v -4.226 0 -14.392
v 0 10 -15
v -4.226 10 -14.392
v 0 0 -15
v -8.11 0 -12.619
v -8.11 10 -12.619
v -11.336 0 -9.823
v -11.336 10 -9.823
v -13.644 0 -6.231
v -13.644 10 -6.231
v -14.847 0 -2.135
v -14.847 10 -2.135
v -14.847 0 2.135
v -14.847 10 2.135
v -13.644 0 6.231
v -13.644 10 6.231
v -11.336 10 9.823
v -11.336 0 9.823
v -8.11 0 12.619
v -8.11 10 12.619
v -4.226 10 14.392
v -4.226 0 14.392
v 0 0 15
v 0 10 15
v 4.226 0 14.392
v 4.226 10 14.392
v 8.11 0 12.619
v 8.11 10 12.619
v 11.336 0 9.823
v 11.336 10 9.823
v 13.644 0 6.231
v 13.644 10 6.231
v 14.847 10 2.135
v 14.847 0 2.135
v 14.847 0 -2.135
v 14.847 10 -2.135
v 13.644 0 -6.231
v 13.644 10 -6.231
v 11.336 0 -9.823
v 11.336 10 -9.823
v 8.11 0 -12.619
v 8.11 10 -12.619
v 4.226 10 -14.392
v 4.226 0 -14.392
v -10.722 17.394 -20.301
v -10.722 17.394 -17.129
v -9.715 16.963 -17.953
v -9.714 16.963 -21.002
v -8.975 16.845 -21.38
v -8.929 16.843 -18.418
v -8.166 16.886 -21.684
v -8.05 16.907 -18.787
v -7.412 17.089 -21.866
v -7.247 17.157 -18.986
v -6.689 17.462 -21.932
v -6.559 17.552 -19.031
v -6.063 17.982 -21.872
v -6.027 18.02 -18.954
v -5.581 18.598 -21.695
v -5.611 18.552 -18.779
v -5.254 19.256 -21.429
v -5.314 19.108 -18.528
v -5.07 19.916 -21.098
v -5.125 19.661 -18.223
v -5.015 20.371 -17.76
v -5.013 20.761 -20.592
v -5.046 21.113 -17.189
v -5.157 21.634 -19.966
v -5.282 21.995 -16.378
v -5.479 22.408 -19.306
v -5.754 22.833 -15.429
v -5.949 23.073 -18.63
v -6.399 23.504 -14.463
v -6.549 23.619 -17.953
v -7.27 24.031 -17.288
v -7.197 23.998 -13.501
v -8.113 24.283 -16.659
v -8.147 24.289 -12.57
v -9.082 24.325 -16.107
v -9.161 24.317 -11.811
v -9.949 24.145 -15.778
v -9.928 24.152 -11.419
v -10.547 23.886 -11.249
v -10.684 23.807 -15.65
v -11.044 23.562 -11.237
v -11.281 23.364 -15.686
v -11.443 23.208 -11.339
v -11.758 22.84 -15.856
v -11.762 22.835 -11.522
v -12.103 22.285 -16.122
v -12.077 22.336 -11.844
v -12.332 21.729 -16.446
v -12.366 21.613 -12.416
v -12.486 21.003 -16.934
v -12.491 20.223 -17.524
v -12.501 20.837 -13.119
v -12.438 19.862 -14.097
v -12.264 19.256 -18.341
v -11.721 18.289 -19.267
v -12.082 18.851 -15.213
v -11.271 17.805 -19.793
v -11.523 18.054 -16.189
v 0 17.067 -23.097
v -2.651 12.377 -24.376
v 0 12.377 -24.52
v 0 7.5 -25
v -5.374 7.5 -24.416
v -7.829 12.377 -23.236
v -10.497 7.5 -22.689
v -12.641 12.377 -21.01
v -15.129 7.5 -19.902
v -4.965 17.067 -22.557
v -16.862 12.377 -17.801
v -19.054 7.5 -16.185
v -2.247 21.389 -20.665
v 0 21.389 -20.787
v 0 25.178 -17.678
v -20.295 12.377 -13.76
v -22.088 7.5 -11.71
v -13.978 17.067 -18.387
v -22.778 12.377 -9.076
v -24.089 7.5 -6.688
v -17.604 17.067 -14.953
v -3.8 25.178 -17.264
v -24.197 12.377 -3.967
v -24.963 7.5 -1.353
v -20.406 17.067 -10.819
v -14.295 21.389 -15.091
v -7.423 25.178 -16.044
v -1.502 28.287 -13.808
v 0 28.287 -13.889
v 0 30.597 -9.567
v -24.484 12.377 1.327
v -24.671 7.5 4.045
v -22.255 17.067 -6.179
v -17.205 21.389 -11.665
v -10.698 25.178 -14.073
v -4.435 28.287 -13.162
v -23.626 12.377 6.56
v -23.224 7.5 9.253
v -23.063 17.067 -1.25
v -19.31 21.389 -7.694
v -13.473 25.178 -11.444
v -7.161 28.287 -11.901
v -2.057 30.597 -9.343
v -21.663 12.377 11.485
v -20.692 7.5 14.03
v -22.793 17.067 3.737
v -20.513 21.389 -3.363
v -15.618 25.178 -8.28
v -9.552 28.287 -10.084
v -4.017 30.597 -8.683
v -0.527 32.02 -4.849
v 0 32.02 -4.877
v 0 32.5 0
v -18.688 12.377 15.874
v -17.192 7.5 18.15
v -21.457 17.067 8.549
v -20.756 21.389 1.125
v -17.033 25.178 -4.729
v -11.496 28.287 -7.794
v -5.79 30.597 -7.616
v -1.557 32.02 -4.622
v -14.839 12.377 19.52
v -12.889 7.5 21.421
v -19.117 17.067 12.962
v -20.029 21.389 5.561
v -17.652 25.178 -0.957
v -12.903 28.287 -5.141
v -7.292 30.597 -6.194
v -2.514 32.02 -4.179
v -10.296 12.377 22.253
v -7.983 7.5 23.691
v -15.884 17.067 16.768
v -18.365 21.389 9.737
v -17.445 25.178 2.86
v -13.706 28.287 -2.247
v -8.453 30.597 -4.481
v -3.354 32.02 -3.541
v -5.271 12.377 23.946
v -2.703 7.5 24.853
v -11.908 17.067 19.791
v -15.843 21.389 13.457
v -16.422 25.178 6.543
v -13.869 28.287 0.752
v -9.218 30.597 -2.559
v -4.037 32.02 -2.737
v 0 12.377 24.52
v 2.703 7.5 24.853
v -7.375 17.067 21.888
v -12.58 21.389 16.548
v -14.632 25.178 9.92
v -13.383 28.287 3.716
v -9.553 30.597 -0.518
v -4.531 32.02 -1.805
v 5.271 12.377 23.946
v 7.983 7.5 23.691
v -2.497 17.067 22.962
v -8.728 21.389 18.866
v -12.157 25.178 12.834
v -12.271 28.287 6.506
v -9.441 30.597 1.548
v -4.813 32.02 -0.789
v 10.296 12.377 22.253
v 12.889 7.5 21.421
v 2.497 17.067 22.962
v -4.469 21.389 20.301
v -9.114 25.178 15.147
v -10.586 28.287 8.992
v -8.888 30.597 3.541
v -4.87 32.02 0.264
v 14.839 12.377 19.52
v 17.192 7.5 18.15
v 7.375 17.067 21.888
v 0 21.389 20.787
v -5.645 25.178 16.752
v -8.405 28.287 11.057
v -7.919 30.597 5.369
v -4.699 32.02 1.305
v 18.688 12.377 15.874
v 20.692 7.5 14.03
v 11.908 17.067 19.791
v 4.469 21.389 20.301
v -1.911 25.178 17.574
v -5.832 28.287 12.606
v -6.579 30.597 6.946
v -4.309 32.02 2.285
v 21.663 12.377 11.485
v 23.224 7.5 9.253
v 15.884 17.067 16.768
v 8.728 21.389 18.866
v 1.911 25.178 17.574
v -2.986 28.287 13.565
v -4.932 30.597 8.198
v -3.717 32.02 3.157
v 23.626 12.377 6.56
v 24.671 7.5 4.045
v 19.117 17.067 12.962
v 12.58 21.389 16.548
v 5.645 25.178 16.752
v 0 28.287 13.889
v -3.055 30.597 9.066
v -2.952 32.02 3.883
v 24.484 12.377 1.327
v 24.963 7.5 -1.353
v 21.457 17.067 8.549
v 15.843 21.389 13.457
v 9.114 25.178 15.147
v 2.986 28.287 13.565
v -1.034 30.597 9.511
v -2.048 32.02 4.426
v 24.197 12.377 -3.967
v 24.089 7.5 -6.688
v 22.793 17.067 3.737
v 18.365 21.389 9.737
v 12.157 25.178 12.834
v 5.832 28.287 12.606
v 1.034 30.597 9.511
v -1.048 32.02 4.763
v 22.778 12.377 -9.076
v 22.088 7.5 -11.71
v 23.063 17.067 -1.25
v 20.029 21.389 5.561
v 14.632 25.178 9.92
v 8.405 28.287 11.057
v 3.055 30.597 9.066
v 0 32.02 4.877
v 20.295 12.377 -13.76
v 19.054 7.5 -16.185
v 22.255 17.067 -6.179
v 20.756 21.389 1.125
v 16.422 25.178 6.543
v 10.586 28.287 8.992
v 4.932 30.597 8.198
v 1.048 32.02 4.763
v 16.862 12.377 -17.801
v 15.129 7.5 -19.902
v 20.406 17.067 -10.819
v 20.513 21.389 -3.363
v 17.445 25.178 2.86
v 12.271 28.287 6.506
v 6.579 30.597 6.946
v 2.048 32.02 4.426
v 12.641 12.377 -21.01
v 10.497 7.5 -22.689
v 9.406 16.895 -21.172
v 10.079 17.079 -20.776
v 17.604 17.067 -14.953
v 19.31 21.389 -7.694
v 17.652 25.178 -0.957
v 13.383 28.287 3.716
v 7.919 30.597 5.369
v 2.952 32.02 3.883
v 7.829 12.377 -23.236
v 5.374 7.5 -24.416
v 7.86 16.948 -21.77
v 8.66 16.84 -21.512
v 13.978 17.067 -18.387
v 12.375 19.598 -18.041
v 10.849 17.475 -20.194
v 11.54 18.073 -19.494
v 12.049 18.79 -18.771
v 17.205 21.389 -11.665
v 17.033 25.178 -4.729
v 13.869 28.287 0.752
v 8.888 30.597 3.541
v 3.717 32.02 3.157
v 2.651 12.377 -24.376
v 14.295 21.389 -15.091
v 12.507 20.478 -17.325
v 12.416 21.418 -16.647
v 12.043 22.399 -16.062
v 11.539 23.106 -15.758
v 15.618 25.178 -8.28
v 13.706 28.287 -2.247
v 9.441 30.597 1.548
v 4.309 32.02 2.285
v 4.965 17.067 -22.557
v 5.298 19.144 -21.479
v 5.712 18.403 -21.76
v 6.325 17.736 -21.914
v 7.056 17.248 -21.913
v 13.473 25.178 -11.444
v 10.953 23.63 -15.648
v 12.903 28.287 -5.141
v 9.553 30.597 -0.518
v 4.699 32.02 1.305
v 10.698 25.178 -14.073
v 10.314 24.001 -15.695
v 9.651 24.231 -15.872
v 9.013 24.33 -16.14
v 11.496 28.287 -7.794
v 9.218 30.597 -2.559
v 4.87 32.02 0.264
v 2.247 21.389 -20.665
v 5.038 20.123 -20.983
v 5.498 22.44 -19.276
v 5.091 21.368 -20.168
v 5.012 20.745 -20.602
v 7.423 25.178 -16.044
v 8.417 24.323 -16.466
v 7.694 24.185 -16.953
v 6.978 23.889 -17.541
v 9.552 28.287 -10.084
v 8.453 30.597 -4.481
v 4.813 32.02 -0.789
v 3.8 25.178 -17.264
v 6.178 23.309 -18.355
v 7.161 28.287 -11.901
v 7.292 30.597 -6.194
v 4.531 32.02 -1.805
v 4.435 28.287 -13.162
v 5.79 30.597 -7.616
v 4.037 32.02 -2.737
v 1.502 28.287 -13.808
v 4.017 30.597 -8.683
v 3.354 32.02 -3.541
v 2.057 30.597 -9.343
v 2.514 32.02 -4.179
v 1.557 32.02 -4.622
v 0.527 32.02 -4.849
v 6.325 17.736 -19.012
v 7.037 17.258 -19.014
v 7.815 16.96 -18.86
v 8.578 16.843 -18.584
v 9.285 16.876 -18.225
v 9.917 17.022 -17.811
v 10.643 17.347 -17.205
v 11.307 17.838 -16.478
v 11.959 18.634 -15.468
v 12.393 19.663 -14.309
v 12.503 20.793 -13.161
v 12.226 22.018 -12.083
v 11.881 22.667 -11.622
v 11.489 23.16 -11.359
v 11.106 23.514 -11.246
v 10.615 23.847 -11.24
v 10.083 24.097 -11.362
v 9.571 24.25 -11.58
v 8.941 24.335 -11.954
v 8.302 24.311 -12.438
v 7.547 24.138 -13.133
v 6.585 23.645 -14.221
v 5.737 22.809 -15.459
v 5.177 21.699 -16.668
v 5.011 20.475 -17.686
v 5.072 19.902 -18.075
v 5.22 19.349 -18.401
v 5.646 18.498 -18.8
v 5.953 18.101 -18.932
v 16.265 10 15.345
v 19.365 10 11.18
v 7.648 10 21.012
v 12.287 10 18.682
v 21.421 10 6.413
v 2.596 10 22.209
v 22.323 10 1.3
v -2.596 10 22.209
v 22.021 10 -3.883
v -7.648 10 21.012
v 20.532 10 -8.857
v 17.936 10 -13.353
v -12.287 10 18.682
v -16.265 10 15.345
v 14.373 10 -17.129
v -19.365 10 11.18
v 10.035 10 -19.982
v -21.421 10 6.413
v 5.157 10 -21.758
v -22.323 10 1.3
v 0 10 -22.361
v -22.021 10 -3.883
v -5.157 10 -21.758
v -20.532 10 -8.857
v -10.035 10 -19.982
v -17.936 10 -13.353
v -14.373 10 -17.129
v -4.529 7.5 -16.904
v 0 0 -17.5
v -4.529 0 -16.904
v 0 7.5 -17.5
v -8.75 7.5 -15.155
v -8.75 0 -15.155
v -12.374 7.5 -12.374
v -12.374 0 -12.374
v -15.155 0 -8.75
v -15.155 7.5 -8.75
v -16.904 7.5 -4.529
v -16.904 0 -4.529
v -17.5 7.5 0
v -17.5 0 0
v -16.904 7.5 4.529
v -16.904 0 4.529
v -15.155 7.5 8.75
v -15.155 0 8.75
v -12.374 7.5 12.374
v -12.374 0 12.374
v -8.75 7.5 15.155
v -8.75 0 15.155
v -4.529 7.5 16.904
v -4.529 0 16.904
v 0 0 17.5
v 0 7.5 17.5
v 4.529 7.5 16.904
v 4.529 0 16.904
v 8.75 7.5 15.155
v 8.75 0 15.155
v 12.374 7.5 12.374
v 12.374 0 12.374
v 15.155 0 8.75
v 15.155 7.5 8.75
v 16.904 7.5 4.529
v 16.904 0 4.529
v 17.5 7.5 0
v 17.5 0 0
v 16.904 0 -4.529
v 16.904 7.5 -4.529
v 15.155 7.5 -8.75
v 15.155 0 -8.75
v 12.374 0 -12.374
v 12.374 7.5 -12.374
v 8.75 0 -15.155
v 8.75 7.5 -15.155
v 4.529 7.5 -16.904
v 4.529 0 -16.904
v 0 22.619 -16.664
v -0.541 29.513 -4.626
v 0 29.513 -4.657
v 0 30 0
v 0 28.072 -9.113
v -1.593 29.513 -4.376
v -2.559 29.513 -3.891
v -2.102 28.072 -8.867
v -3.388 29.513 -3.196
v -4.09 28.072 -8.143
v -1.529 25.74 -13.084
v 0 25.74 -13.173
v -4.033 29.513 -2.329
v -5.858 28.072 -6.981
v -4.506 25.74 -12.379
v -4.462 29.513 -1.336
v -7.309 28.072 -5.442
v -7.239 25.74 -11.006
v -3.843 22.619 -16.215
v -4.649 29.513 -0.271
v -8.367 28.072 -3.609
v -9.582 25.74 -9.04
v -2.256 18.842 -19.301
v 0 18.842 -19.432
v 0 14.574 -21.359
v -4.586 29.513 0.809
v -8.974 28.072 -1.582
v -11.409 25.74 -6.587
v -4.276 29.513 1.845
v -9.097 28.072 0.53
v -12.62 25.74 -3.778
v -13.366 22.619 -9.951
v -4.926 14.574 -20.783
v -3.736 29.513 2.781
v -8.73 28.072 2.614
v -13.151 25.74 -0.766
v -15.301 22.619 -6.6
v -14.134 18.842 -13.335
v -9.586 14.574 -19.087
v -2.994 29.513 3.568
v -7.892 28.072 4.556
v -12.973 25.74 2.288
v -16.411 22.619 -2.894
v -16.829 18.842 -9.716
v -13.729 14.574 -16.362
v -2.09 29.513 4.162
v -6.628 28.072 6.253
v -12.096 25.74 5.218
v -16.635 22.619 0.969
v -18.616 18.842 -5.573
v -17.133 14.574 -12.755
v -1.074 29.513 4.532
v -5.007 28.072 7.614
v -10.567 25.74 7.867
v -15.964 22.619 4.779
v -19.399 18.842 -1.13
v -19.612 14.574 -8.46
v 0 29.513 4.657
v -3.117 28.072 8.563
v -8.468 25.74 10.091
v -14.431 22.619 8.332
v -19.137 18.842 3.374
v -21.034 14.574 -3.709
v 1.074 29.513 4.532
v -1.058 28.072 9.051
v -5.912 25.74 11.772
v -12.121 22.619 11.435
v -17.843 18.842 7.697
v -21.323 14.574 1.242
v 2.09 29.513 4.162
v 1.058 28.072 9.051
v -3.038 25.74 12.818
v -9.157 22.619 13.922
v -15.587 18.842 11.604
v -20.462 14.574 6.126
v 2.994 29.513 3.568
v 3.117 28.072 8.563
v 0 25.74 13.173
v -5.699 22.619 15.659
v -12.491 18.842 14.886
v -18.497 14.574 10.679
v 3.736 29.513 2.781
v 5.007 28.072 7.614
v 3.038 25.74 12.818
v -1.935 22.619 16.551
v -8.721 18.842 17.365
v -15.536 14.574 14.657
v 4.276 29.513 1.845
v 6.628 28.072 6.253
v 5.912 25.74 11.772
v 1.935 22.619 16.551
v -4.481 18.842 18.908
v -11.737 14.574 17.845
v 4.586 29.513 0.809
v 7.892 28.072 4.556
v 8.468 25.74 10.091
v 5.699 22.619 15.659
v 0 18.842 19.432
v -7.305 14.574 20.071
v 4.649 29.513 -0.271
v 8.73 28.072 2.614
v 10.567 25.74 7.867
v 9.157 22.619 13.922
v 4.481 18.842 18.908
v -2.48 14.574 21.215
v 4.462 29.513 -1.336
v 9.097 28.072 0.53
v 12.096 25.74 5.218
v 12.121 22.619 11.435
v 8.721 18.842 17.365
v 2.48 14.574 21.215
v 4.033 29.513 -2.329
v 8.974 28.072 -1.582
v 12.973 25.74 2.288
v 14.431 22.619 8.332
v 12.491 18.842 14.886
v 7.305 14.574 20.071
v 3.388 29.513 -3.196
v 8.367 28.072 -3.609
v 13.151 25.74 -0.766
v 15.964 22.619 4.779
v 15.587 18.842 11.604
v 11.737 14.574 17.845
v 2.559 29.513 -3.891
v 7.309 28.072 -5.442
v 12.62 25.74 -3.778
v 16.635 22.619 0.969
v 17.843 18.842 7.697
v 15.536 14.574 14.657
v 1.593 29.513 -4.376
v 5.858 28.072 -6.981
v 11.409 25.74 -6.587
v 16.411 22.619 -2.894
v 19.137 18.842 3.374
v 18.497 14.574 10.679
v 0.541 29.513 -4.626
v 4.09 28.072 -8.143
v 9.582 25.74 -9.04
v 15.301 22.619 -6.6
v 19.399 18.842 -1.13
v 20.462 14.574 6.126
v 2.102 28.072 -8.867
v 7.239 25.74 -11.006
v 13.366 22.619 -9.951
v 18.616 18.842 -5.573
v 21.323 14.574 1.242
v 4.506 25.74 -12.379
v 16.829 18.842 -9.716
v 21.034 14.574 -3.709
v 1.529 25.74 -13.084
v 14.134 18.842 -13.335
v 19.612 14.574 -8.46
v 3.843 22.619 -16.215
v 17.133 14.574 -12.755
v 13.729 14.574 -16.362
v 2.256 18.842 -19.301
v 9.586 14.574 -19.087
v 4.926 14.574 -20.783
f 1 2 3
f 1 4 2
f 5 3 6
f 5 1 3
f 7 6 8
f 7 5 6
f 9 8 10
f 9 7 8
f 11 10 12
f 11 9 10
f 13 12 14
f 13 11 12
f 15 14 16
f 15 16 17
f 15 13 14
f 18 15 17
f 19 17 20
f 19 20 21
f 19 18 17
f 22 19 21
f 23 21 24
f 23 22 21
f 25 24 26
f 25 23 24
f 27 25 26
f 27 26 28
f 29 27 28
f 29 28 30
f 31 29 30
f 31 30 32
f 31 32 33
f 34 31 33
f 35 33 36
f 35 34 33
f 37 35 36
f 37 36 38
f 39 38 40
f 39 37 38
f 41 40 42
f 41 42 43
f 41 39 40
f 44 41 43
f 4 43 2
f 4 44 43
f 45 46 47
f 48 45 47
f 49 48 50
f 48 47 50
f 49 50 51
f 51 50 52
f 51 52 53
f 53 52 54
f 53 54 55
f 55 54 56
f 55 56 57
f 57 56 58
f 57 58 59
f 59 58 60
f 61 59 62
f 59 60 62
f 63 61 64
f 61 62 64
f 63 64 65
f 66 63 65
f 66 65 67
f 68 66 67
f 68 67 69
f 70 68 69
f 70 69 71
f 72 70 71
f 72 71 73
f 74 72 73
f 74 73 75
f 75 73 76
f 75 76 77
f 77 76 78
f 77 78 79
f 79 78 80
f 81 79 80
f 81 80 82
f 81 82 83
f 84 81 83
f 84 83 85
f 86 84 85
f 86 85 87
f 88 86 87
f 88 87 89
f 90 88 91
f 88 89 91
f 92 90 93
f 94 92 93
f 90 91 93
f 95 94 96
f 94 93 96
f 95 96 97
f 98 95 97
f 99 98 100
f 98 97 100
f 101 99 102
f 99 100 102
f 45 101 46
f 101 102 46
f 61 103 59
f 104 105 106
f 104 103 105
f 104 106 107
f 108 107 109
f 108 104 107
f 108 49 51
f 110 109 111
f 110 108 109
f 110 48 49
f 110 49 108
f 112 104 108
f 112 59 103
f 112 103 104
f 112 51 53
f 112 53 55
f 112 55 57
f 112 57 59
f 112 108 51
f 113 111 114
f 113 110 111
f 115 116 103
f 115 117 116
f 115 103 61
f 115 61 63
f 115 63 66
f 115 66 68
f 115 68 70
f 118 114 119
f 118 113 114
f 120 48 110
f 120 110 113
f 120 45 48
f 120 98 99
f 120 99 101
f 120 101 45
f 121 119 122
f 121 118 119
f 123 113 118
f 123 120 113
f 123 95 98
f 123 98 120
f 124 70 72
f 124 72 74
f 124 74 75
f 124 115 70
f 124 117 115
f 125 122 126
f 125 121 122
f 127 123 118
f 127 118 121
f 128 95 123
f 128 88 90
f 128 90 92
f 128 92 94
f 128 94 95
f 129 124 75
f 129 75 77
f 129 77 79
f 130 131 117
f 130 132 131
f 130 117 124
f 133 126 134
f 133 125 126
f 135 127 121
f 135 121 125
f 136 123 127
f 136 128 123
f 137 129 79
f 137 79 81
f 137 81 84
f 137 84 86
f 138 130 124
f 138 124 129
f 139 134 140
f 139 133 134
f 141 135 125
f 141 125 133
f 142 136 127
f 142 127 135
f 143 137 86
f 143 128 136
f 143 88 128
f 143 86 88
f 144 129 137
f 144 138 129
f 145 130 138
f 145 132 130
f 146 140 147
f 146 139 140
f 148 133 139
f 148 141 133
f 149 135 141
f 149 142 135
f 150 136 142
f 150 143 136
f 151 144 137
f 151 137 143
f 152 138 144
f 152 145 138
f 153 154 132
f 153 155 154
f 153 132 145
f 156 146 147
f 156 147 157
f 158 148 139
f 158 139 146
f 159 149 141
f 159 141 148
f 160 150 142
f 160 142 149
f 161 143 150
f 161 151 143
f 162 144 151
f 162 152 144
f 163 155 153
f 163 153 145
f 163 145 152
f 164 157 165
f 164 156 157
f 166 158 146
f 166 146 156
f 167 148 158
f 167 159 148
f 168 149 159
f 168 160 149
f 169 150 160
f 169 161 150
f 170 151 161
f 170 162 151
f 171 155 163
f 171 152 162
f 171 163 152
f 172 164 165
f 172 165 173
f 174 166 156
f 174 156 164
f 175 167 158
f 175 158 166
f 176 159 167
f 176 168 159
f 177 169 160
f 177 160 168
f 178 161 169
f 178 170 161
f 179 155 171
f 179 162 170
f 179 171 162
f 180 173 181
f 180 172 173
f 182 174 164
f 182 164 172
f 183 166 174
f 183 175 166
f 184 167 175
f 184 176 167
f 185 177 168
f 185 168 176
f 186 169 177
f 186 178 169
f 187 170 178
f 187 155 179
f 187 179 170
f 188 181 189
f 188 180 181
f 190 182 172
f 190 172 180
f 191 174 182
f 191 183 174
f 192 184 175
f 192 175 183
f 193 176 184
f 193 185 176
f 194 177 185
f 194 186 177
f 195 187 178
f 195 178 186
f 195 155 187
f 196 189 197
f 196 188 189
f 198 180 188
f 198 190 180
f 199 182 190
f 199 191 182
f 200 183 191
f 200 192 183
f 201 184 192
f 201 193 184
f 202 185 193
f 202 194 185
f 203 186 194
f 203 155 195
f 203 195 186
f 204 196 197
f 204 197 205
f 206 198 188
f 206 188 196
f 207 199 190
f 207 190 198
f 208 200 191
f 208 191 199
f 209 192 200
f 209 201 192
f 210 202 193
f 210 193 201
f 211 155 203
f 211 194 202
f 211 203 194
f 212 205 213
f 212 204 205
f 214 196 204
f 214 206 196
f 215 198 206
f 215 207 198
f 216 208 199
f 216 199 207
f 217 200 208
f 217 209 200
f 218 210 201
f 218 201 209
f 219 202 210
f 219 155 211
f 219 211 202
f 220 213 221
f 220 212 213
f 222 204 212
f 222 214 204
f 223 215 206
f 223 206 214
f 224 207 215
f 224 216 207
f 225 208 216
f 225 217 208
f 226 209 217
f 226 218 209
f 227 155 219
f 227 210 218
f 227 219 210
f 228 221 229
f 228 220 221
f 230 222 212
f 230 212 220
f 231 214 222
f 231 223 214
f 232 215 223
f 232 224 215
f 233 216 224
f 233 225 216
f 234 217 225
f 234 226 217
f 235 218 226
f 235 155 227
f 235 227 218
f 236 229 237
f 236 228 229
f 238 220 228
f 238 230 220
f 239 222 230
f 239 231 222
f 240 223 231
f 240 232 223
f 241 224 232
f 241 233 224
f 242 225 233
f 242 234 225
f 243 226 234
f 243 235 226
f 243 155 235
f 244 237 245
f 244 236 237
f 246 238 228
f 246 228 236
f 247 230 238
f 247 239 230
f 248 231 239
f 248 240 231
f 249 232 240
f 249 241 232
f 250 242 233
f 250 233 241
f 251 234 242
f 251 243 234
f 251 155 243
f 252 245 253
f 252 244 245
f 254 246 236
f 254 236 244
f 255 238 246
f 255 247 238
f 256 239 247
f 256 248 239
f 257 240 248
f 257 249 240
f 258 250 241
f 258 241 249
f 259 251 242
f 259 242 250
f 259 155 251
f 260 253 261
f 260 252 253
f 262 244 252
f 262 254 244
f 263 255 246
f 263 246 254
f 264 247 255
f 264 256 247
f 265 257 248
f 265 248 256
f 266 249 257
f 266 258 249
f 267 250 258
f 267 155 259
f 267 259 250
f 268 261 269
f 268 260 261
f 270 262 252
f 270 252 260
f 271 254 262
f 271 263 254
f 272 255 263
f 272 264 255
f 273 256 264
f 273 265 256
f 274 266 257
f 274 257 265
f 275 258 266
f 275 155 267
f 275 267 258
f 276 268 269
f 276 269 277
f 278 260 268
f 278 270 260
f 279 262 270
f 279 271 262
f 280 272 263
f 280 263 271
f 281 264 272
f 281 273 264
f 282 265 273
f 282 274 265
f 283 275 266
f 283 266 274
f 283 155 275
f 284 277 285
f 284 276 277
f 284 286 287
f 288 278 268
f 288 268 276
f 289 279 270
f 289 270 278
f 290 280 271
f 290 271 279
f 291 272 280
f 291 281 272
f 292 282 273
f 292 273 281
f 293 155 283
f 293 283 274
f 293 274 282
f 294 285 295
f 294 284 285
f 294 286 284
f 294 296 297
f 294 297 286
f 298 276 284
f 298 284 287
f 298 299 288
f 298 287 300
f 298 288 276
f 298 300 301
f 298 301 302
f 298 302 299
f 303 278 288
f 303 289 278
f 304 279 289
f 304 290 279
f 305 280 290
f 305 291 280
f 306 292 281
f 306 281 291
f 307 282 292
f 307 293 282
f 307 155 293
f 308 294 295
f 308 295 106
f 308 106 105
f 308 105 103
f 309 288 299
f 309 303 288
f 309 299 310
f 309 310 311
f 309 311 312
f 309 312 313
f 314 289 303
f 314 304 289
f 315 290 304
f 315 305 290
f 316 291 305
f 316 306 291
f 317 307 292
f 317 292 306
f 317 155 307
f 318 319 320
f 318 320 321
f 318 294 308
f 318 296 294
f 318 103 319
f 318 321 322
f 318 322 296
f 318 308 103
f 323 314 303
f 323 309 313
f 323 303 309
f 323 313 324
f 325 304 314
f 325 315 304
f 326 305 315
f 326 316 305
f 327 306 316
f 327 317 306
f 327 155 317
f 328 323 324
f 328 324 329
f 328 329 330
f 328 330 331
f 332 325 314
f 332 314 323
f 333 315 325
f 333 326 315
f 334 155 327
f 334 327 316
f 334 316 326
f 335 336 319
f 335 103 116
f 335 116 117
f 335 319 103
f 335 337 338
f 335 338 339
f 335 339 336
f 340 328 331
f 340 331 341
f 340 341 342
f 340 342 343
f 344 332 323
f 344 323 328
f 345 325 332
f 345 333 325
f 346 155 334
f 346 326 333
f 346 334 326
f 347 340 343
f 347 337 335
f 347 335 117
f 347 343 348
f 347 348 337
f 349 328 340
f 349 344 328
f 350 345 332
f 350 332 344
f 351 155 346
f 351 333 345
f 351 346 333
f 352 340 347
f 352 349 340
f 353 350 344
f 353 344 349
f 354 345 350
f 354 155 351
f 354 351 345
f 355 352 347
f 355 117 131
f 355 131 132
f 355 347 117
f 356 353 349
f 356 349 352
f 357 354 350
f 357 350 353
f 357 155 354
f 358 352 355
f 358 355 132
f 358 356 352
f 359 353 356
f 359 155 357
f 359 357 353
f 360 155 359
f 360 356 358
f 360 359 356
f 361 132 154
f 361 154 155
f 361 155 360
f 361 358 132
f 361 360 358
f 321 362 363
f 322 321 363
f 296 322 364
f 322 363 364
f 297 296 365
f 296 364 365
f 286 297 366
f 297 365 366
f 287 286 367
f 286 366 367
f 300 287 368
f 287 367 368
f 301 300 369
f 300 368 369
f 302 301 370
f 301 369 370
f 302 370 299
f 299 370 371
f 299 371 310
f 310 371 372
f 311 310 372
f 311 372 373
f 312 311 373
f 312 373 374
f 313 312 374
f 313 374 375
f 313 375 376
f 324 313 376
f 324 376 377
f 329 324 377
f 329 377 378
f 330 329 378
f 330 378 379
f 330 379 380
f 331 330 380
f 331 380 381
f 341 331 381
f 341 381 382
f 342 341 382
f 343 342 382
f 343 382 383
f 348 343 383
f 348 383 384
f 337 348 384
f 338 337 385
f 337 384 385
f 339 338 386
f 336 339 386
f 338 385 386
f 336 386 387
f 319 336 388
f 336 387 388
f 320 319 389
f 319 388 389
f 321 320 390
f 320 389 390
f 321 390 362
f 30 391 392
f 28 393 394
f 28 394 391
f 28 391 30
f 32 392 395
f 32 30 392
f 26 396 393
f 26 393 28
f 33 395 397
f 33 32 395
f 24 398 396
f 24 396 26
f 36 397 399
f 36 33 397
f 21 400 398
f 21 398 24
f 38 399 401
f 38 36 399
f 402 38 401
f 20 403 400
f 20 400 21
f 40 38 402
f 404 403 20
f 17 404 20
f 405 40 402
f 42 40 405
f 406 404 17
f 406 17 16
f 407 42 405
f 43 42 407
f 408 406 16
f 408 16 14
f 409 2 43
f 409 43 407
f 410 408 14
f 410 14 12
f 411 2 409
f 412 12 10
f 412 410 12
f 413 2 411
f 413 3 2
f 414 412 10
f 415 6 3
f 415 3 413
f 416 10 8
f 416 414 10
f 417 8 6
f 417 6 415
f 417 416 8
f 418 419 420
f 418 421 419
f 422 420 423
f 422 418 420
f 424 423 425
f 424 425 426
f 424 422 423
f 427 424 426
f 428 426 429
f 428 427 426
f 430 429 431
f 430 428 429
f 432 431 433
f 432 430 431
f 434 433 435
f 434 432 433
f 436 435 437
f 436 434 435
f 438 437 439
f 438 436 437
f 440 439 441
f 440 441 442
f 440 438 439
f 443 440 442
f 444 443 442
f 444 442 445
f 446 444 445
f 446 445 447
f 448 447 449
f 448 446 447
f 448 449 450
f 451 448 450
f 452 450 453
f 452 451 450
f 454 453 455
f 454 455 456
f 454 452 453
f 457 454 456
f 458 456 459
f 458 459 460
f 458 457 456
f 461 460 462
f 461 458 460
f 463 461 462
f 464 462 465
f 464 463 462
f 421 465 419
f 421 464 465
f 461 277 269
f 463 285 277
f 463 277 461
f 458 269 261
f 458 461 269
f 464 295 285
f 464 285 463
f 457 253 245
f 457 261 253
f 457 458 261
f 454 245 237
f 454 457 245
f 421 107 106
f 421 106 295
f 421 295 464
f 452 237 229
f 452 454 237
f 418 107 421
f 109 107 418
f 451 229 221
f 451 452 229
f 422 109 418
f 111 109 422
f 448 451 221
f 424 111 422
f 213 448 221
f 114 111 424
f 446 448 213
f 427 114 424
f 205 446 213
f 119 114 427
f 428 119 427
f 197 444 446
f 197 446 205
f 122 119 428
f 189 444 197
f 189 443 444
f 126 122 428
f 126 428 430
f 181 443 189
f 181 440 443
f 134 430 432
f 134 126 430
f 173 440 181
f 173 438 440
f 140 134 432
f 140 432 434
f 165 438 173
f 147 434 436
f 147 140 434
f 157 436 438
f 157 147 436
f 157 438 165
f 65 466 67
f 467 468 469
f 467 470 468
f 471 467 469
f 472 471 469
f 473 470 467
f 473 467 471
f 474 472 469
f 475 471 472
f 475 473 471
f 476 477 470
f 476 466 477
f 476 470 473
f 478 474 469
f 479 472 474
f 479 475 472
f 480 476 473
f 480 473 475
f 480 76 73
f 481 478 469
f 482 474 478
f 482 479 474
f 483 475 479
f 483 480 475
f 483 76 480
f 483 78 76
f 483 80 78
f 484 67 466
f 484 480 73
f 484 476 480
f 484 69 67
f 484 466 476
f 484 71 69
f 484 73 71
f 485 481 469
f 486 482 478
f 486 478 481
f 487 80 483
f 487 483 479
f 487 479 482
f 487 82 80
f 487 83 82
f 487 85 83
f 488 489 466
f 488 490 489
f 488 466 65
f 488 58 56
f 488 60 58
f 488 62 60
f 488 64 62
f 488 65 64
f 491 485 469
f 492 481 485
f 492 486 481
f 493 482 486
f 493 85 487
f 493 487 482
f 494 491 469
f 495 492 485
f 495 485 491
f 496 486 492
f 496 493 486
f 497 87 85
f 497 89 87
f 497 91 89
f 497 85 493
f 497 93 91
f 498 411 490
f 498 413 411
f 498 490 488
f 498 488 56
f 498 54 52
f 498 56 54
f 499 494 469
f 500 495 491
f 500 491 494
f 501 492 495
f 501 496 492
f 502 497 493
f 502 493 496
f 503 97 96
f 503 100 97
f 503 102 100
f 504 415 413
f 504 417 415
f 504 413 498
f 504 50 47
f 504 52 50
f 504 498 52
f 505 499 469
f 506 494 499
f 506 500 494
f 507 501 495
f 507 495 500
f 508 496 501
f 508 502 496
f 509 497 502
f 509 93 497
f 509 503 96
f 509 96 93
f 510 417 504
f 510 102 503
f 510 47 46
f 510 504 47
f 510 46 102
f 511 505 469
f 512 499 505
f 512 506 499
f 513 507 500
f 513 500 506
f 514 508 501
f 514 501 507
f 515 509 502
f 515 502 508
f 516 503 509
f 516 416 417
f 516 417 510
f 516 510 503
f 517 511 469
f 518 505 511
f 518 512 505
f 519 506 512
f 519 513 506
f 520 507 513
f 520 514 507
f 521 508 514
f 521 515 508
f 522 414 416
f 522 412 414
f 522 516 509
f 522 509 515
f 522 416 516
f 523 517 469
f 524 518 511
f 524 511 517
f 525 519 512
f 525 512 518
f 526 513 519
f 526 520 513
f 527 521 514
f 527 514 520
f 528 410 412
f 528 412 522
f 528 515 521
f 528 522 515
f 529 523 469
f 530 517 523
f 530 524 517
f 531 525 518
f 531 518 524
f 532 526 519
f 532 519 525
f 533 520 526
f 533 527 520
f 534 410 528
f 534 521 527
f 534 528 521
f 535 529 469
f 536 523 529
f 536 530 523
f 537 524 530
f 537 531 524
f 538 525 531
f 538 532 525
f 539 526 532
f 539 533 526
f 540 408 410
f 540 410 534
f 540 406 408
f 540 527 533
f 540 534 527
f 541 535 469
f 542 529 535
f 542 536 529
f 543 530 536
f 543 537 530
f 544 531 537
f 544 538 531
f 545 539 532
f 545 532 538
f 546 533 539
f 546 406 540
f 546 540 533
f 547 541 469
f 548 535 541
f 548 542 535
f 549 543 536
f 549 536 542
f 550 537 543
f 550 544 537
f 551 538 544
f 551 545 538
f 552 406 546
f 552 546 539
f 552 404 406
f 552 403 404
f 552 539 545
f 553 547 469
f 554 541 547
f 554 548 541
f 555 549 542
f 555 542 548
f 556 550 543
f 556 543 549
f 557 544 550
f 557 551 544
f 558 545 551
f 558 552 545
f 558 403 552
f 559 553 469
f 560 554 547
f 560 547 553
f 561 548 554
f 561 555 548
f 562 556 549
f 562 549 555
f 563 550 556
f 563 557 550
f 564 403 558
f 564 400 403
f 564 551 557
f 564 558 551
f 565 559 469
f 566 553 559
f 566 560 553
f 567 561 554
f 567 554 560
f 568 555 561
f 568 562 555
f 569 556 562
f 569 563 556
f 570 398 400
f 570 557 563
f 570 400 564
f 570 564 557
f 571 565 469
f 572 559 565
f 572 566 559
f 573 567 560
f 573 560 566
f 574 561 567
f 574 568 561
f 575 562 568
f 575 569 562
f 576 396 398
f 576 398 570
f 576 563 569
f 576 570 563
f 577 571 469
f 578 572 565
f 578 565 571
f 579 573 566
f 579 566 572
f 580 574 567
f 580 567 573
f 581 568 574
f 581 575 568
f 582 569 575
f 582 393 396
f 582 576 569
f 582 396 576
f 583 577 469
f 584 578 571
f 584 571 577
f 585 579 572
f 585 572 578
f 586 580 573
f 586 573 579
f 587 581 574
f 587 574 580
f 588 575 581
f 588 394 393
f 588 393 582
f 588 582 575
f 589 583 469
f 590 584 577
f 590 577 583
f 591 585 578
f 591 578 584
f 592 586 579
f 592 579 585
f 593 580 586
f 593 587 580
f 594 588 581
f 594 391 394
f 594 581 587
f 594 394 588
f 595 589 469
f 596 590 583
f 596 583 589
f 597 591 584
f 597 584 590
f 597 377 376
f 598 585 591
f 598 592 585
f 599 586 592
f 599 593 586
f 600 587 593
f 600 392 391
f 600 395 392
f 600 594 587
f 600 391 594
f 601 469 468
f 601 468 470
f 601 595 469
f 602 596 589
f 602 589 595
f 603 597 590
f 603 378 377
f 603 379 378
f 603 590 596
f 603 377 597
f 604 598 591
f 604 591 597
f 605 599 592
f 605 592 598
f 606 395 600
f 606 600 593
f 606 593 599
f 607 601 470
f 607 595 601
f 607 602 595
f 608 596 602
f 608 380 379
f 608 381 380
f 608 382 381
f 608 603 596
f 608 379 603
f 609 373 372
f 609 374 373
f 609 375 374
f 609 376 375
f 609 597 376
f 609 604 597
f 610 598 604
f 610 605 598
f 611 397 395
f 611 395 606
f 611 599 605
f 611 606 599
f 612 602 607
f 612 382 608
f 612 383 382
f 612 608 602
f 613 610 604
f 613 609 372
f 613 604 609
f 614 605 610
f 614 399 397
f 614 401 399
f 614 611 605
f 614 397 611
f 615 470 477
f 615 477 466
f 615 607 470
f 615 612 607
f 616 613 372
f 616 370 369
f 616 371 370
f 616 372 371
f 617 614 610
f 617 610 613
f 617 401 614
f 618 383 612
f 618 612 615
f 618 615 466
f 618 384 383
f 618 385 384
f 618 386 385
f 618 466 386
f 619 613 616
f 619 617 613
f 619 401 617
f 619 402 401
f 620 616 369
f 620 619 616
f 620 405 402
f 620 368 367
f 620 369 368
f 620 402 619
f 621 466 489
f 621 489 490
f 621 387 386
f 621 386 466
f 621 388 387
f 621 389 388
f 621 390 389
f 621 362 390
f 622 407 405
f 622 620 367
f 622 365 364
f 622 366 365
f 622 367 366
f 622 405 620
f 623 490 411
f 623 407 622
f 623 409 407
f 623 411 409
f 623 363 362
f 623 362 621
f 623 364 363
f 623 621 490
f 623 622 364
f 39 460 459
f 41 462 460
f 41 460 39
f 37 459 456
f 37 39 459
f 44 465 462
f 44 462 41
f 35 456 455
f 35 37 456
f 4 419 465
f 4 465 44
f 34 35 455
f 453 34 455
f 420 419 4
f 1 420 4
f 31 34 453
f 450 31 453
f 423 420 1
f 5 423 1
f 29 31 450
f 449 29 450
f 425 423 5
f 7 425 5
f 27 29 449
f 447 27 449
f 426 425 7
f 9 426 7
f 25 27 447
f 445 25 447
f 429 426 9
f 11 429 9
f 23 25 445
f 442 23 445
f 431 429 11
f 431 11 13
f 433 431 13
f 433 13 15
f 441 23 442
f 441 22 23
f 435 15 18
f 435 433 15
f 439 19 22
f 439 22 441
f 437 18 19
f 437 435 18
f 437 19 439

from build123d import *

# Parameters (mm, degrees)
SKETCH2_R          = 3.75
CUT_EXTRUDE1_DEPTH = 500


with BuildPart() as part:
    # Sketch1 → Revolve1 (revolve)
    with BuildSketch(Plane.XY, mode=Mode.PRIVATE) as revolve1_sk:
        with BuildLine():
            Line((17.5, 0), (17.5, 7.5))
            Line((17.5, 7.5), (25, 7.5))
            ThreePointArc((25, 7.5), (17.67766953, 25.17766953), (0, 32.5))
            Line((0, 32.5), (0, 30))
            ThreePointArc((0, 30), (15, 24.270509831), (22.360679775, 10))
            Line((22.360679775, 10), (15, 10))
            Line((15, 10), (15, 0))
            Line((15, 0), (17.5, 0))
        make_face()
    revolve(revolve1_sk.sketch.rotate(Axis((0, 0, 0), (0, 1, 0)), 90), axis=Axis((0, 0, 0), (0, 1, 0)))

    # Sketch2 → Cut-Extrude1 (cut)
    with BuildSketch(Plane.XY):
        with Locations(Location((8.758891379, 20.589020037, 0), (0, 0, 229.536406865))):
            Circle(SKETCH2_R)
        with Locations(Location((-8.758891379, 20.589020037, 0), (0, 0, 238.427728908))):
            Circle(SKETCH2_R)
    extrude(amount=-CUT_EXTRUDE1_DEPTH, mode=Mode.SUBTRACT)


solid = part.part
